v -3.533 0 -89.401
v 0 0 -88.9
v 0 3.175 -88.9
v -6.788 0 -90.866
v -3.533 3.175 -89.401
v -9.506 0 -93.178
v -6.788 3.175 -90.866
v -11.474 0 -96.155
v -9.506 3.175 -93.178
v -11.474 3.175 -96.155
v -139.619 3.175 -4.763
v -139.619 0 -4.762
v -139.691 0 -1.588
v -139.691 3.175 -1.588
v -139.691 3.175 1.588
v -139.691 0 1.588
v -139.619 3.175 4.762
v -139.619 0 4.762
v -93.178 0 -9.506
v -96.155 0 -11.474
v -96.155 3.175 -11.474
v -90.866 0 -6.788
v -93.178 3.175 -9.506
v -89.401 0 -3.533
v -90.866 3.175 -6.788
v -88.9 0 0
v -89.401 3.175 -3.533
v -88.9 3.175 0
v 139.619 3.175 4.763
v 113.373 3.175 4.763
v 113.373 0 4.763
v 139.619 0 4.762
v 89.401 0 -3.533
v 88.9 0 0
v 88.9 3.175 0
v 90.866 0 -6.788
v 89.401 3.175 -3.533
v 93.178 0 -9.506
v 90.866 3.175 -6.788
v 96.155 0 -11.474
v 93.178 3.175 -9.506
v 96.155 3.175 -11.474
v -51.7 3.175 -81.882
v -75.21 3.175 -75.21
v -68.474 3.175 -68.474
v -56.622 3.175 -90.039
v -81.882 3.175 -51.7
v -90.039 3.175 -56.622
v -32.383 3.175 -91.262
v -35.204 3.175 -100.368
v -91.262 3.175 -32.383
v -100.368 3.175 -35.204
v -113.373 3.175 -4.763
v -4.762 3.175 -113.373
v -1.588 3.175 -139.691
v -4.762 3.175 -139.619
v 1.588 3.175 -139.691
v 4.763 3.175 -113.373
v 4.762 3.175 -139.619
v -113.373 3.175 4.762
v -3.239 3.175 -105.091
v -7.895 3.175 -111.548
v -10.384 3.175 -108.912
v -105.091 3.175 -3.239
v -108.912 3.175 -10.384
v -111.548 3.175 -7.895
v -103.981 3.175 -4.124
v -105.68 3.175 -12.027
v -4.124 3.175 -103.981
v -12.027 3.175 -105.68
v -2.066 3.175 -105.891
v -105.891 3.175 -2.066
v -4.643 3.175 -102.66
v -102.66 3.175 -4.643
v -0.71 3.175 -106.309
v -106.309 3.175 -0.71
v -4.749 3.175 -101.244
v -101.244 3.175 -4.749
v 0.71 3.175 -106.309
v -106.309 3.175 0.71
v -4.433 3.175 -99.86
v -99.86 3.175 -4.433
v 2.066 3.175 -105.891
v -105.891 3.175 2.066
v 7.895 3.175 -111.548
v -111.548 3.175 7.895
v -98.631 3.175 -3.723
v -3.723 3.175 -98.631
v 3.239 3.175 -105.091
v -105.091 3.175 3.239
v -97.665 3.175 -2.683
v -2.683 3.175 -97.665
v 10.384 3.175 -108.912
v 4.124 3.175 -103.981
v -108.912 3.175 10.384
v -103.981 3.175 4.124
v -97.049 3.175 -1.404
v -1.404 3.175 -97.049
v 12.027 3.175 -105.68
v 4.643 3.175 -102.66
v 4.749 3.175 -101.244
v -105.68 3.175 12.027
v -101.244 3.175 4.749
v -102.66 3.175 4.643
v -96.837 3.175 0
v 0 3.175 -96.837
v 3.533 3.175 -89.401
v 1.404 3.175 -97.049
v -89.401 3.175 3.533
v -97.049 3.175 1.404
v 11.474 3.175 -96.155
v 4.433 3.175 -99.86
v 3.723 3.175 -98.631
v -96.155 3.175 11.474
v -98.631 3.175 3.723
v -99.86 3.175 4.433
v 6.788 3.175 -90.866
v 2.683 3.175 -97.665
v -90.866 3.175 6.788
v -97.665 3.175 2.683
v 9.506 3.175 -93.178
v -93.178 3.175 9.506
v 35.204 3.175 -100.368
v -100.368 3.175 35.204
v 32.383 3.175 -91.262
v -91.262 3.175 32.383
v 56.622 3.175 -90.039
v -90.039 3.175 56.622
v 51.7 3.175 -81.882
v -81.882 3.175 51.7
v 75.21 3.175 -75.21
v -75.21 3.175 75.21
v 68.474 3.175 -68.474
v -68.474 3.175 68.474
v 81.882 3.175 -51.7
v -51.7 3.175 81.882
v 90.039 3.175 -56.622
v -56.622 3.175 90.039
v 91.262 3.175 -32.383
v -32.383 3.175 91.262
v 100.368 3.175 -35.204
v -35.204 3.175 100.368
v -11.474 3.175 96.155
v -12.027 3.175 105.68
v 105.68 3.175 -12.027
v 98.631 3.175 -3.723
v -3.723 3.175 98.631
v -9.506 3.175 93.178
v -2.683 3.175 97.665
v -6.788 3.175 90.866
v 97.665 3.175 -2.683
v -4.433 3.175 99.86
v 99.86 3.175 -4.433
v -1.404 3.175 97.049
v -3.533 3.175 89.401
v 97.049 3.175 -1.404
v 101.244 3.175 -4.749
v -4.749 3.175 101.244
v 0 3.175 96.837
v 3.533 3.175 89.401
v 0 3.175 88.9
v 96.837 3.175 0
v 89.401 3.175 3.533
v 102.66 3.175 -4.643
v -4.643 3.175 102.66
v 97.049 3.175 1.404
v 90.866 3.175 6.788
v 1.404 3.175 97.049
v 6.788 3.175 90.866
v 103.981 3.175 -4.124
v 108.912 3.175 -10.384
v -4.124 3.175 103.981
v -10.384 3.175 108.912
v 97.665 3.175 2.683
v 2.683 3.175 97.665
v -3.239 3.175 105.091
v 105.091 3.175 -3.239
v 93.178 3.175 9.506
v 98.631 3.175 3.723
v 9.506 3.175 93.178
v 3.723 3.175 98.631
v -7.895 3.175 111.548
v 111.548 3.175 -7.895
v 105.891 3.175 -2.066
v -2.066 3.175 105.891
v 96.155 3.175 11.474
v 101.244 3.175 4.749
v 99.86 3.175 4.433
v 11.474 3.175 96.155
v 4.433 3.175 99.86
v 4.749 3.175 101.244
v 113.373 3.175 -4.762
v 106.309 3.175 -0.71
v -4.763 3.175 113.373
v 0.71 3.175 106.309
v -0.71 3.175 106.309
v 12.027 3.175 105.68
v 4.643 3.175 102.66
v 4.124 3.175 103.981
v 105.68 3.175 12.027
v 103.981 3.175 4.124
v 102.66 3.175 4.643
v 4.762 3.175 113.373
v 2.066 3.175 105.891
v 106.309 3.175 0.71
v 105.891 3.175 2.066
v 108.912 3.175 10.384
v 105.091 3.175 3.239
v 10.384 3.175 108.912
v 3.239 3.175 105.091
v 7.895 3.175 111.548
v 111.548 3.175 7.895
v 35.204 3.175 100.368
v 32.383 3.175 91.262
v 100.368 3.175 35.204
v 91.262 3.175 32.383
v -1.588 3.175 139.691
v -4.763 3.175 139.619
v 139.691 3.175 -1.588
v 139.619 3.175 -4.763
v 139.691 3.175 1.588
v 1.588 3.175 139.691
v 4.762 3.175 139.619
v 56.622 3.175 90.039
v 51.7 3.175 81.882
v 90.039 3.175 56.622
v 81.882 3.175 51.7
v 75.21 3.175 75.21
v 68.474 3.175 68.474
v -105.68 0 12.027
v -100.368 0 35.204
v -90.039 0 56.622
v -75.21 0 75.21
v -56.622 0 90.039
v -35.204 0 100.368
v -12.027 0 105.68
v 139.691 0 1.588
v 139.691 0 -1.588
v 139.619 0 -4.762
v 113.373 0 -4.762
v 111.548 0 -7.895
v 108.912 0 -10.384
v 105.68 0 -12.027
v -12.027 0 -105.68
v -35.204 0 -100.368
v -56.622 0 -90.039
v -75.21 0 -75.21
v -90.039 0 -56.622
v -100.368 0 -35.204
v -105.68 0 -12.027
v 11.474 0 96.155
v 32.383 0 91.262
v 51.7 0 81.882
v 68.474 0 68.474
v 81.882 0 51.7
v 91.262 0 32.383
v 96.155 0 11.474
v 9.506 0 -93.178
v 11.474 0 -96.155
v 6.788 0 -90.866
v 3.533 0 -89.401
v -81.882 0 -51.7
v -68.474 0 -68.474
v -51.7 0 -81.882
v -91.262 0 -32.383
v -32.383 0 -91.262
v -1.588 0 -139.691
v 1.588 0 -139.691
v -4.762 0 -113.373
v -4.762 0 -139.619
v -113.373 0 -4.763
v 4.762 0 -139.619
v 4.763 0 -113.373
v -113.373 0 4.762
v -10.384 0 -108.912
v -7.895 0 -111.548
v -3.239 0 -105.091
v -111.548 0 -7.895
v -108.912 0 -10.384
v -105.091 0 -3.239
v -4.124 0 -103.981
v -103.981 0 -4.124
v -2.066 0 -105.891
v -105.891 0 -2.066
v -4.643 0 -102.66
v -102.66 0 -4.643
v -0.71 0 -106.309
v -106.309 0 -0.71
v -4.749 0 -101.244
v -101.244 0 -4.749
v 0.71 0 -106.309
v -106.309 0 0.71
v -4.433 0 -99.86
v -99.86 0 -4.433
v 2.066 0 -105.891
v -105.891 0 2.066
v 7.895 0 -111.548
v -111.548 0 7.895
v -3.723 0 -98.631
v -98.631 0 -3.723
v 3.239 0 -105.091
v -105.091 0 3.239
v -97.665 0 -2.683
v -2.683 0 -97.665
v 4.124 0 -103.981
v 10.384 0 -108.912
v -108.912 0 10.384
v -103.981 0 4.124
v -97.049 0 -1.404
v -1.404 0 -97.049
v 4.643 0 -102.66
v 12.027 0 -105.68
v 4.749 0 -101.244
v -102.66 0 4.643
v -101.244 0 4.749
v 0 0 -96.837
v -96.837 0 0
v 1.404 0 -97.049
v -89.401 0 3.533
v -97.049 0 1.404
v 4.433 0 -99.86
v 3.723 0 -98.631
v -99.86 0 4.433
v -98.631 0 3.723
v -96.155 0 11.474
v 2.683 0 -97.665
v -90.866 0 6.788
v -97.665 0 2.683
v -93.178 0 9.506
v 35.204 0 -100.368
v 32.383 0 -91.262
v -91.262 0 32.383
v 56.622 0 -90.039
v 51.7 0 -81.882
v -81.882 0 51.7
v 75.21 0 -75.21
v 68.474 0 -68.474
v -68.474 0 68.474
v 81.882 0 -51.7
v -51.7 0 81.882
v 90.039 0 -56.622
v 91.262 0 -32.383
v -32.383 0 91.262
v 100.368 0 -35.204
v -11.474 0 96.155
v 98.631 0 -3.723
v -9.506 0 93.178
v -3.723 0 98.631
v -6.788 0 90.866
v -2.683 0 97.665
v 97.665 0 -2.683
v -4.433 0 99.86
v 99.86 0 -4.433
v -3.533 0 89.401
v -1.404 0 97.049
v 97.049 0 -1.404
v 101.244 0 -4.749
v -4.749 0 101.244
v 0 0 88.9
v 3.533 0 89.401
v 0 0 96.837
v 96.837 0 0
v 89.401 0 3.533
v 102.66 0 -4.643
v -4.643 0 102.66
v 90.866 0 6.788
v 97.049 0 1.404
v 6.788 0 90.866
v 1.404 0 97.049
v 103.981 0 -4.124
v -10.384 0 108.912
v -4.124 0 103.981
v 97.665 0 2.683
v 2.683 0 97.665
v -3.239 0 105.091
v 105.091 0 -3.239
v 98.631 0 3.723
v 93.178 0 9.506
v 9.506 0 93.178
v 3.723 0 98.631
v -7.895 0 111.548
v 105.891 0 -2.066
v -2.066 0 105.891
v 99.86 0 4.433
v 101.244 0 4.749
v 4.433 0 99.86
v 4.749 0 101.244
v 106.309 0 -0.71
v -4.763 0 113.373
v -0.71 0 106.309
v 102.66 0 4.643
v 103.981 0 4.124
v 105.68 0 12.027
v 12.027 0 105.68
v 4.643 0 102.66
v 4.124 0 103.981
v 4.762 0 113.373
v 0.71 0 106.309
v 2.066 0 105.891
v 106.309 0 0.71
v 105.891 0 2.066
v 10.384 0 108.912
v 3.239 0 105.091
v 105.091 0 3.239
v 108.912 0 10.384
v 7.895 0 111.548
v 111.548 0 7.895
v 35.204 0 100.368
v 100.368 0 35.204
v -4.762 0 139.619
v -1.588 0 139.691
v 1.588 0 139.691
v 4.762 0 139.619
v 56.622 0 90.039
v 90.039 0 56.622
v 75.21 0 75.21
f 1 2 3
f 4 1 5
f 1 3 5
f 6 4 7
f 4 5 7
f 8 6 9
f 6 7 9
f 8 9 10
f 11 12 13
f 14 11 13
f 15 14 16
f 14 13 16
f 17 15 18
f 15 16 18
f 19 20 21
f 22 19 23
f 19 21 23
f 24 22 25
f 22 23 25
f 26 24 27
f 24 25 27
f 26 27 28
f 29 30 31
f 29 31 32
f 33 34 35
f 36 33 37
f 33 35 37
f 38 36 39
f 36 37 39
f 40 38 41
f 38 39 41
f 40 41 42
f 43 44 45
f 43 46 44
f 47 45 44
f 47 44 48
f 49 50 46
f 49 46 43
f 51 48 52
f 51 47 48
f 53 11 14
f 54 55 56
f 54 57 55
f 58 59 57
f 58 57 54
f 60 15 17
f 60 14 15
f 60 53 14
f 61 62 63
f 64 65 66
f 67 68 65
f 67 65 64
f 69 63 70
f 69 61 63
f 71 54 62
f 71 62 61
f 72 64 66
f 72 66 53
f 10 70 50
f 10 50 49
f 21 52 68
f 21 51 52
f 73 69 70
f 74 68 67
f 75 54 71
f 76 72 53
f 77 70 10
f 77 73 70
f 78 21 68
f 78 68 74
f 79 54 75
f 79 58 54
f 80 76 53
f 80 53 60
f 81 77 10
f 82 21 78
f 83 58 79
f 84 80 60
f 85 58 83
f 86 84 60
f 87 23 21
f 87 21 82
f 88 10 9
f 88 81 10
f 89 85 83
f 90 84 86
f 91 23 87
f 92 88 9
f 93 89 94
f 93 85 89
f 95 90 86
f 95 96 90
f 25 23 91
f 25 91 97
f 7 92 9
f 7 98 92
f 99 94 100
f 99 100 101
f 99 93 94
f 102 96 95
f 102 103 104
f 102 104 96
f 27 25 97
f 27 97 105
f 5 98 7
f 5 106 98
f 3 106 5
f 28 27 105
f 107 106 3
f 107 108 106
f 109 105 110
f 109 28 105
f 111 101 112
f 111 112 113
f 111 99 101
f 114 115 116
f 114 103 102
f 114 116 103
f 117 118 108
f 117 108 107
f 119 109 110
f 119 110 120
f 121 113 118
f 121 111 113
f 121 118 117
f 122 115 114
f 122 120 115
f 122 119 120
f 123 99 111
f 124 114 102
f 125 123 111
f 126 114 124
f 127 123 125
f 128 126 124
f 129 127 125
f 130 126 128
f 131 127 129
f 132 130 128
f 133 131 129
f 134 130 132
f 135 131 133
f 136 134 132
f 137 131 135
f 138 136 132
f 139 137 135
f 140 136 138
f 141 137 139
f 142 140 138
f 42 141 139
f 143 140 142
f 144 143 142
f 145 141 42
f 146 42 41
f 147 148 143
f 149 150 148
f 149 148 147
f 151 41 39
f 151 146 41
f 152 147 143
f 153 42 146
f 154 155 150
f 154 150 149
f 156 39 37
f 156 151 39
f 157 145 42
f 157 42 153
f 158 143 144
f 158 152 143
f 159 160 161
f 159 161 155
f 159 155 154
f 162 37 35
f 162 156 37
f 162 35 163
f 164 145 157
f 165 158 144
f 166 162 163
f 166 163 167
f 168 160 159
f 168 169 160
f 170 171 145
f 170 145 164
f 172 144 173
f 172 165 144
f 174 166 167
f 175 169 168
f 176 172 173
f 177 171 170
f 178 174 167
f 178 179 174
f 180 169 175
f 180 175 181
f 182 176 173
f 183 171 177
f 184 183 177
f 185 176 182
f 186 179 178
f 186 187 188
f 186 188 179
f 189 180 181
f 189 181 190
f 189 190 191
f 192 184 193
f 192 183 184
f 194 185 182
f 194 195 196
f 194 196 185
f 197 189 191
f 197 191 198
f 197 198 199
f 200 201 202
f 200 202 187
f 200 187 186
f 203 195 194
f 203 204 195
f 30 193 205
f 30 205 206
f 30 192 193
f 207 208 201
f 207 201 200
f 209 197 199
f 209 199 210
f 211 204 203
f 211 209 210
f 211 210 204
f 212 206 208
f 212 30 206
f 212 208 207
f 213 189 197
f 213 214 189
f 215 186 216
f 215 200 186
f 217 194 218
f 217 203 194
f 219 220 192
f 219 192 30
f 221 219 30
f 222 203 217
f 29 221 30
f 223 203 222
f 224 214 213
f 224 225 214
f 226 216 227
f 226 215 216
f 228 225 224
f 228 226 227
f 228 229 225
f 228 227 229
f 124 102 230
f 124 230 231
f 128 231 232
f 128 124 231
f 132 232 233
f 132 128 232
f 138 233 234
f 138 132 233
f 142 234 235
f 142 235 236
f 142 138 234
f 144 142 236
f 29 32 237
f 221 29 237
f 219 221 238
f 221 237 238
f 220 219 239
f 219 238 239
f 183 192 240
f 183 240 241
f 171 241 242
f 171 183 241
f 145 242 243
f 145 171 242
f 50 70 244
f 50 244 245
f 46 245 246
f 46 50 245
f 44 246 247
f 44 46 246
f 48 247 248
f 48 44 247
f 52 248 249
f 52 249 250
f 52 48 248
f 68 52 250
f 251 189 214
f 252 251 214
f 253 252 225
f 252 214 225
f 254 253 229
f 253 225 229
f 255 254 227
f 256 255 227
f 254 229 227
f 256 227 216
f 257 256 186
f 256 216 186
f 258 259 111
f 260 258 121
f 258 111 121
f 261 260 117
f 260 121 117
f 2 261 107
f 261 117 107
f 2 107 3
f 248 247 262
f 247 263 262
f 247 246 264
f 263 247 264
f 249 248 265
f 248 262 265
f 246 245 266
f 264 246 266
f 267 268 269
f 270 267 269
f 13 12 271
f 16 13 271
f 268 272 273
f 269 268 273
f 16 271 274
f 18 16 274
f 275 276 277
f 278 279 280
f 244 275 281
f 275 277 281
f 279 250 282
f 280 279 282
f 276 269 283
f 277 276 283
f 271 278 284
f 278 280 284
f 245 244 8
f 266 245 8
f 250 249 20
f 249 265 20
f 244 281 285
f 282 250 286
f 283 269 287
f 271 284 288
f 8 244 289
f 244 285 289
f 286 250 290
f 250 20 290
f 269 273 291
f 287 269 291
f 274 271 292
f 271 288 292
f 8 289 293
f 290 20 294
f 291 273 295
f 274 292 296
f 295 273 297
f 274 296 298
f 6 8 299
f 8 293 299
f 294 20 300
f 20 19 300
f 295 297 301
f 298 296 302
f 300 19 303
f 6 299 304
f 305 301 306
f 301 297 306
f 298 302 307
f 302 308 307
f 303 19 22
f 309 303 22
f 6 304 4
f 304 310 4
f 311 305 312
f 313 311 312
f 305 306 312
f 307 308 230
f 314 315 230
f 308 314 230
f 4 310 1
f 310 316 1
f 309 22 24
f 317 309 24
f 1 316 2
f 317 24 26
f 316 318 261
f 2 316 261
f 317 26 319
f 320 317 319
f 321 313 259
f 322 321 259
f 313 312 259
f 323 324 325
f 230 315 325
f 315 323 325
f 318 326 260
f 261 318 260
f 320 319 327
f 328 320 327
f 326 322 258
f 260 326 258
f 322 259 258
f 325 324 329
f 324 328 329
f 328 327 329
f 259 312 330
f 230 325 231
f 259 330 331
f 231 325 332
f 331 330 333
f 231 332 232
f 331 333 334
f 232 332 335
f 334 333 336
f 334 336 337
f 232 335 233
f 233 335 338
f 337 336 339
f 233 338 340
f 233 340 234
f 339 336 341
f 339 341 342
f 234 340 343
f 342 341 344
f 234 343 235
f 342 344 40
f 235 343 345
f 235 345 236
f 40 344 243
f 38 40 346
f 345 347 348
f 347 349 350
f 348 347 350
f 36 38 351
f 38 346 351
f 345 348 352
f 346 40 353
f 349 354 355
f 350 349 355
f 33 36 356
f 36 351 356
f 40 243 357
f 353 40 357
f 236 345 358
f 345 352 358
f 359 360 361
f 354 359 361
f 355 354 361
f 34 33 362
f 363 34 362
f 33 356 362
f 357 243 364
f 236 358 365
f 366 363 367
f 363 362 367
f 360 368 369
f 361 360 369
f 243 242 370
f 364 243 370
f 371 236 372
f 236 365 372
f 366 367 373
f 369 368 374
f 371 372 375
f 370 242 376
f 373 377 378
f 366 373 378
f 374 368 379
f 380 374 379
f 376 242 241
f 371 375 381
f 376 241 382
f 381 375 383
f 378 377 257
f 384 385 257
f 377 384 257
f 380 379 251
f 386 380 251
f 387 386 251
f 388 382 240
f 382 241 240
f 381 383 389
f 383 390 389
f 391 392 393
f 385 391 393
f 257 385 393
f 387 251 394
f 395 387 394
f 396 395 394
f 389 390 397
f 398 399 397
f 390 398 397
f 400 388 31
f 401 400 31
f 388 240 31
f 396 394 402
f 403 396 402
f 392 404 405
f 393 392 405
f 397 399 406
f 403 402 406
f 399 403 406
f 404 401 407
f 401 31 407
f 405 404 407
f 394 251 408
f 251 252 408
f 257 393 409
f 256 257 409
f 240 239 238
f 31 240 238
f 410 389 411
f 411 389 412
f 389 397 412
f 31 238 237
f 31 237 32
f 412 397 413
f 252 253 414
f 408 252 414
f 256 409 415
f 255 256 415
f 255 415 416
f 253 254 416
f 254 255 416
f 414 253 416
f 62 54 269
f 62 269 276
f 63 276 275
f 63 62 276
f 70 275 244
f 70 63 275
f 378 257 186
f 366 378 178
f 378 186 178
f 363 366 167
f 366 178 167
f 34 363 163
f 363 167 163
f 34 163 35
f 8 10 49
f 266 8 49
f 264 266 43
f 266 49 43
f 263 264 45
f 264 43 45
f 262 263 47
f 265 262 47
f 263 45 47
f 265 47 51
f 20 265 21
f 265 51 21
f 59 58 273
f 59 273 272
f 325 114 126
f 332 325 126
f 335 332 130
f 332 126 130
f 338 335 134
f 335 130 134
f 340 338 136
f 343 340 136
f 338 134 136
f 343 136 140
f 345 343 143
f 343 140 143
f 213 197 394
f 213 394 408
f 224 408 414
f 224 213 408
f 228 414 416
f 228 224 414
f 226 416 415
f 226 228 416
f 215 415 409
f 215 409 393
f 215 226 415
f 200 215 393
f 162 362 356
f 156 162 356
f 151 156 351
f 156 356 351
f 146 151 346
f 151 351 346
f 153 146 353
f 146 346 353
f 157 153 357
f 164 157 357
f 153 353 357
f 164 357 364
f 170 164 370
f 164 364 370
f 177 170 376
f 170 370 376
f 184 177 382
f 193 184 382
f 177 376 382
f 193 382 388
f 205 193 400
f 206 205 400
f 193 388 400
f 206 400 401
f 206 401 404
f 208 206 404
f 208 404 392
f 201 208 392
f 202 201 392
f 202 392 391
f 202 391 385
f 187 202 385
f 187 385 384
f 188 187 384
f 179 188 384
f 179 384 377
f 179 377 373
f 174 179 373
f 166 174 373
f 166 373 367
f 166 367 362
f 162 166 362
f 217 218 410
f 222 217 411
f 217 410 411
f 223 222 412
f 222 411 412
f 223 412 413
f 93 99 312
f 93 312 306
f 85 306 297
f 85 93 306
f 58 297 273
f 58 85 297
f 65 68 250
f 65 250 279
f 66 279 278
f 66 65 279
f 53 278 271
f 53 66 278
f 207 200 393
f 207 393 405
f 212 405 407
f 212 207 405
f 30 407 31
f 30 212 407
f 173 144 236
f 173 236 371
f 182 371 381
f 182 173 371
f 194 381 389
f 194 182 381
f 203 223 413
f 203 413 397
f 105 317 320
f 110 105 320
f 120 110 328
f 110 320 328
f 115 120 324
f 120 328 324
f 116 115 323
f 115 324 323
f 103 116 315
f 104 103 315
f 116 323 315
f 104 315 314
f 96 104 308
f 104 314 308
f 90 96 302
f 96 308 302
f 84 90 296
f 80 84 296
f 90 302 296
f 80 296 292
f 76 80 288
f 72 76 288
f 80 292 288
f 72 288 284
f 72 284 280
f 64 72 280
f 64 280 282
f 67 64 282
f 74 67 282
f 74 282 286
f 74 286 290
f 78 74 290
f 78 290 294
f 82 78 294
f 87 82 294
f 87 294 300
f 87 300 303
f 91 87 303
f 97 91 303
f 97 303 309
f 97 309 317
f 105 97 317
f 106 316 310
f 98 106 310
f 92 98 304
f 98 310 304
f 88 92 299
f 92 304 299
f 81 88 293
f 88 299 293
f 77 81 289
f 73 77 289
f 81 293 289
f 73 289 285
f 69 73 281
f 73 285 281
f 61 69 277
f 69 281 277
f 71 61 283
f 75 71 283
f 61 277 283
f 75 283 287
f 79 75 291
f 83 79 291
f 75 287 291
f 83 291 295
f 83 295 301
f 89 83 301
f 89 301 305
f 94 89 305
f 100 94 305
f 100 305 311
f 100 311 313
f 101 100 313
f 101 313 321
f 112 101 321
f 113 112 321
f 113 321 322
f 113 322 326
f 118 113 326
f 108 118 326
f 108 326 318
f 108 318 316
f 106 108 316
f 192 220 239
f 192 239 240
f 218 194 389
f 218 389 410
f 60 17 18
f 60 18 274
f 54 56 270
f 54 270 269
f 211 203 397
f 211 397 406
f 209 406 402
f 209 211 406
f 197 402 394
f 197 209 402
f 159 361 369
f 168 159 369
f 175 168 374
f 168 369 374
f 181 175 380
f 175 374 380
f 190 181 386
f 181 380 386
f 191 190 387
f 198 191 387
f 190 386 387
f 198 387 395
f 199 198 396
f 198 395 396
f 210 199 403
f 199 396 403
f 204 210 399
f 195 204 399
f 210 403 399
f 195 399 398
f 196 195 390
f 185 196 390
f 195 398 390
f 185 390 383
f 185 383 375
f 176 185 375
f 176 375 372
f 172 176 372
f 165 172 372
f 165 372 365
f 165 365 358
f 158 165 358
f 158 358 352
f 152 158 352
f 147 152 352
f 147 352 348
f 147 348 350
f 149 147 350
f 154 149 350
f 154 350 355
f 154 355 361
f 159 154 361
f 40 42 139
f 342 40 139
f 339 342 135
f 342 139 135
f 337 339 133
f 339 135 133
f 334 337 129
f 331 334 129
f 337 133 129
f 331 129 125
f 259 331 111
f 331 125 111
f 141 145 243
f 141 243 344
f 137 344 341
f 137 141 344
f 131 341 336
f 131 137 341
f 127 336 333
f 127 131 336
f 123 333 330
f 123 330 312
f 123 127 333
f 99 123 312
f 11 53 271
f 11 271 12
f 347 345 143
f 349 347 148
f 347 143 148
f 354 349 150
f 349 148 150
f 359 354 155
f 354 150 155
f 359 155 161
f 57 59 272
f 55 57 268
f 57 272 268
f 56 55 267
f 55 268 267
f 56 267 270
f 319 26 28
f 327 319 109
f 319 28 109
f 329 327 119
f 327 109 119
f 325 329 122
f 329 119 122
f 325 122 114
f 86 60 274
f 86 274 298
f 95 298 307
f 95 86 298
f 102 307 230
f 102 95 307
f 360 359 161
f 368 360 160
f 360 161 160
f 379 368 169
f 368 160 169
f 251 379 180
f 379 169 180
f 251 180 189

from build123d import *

# Parameters (mm, degrees)
SKETCH1_R                    = 139.7
BOSS_EXTRUDE1_DEPTH          = 3.175
CUT_EXTRUDE1_DEPTH           = 198.591145108
F_3_8_0_375_DIAMETER_HOLE1_D = 9.525
CIRPATTERN2_COUNT            = 4


with BuildPart() as part:
    # Sketch1 → Boss-Extrude1 (new body)
    with BuildSketch(Plane(origin=(0, 0, 0), x_dir=(1, 0, 0), z_dir=(0, 1, 0))):
        with Locations(Location((0, 0, 0), (0, 0, 270))):
            Circle(SKETCH1_R)
    extrude(amount=BOSS_EXTRUDE1_DEPTH)

    # Sketch2 → Cut-Extrude1 (cut, through all)
    with BuildSketch(Plane(origin=(0, 3.175, 0), x_dir=(1, 0, 0), z_dir=(0, 1, 0))):
        with BuildLine():
            Line((139.618797423, 4.7625), (113.373215098, 4.7625))
            ThreePointArc((113.373215098, 4.7625), (110.319292235, 9.233847677), (105.680371094, 12.026660872))
            ThreePointArc((105.680371094, 12.026660872), (75.209645014, 75.209645014), (12.026660872, 105.680371094))
            ThreePointArc((12.026660872, 105.680371094), (9.233847677, 110.319292235), (4.7625, 113.373215098))
            Line((4.7625, 113.373215098), (4.7625, 139.618797423))
            ThreePointArc((4.7625, 139.618797423), (98.782817332, 98.782817332), (139.618797423, 4.7625))
        make_face()
        with BuildLine():
            Line((0, 88.9), (0, 0))
            Line((0, 0), (88.9, 0))
            ThreePointArc((88.9, 0), (90.866016883, 6.787606828), (96.155371094, 11.473709778))
            ThreePointArc((96.155371094, 11.473709778), (68.474452923, 68.474452923), (11.473709778, 96.155371094))
            ThreePointArc((11.473709778, 96.155371094), (6.787606828, 90.866016883), (0, 88.9))
        make_face()
    cut_extrude1 = extrude(amount=-CUT_EXTRUDE1_DEPTH, mode=Mode.SUBTRACT)

    # 3/8 (0.375) Diameter Hole1 (through all)
    with Locations(Plane(origin=(0, 3.175, 0), x_dir=(1, 0, 0), z_dir=(0, 1, 0))):
        with Locations((101.6, 0)):
            f_3_8_0_375_diameter_hole1 = Hole(F_3_8_0_375_DIAMETER_HOLE1_D / 2)

    # CirPattern2: Cut-Extrude1, 3/8 (0.375) Diameter Hole1 ×4 about axis
    cirpattern2_axis = Axis((0, 0, 0), (0, 1, 0))
    add([cut_extrude1.rotate(cirpattern2_axis, i * 360 / CIRPATTERN2_COUNT) for i in range(1, CIRPATTERN2_COUNT)], mode=Mode.SUBTRACT)
    add([f_3_8_0_375_diameter_hole1.rotate(cirpattern2_axis, i * 360 / CIRPATTERN2_COUNT) for i in range(1, CIRPATTERN2_COUNT)], mode=Mode.SUBTRACT)


solid = part.part
